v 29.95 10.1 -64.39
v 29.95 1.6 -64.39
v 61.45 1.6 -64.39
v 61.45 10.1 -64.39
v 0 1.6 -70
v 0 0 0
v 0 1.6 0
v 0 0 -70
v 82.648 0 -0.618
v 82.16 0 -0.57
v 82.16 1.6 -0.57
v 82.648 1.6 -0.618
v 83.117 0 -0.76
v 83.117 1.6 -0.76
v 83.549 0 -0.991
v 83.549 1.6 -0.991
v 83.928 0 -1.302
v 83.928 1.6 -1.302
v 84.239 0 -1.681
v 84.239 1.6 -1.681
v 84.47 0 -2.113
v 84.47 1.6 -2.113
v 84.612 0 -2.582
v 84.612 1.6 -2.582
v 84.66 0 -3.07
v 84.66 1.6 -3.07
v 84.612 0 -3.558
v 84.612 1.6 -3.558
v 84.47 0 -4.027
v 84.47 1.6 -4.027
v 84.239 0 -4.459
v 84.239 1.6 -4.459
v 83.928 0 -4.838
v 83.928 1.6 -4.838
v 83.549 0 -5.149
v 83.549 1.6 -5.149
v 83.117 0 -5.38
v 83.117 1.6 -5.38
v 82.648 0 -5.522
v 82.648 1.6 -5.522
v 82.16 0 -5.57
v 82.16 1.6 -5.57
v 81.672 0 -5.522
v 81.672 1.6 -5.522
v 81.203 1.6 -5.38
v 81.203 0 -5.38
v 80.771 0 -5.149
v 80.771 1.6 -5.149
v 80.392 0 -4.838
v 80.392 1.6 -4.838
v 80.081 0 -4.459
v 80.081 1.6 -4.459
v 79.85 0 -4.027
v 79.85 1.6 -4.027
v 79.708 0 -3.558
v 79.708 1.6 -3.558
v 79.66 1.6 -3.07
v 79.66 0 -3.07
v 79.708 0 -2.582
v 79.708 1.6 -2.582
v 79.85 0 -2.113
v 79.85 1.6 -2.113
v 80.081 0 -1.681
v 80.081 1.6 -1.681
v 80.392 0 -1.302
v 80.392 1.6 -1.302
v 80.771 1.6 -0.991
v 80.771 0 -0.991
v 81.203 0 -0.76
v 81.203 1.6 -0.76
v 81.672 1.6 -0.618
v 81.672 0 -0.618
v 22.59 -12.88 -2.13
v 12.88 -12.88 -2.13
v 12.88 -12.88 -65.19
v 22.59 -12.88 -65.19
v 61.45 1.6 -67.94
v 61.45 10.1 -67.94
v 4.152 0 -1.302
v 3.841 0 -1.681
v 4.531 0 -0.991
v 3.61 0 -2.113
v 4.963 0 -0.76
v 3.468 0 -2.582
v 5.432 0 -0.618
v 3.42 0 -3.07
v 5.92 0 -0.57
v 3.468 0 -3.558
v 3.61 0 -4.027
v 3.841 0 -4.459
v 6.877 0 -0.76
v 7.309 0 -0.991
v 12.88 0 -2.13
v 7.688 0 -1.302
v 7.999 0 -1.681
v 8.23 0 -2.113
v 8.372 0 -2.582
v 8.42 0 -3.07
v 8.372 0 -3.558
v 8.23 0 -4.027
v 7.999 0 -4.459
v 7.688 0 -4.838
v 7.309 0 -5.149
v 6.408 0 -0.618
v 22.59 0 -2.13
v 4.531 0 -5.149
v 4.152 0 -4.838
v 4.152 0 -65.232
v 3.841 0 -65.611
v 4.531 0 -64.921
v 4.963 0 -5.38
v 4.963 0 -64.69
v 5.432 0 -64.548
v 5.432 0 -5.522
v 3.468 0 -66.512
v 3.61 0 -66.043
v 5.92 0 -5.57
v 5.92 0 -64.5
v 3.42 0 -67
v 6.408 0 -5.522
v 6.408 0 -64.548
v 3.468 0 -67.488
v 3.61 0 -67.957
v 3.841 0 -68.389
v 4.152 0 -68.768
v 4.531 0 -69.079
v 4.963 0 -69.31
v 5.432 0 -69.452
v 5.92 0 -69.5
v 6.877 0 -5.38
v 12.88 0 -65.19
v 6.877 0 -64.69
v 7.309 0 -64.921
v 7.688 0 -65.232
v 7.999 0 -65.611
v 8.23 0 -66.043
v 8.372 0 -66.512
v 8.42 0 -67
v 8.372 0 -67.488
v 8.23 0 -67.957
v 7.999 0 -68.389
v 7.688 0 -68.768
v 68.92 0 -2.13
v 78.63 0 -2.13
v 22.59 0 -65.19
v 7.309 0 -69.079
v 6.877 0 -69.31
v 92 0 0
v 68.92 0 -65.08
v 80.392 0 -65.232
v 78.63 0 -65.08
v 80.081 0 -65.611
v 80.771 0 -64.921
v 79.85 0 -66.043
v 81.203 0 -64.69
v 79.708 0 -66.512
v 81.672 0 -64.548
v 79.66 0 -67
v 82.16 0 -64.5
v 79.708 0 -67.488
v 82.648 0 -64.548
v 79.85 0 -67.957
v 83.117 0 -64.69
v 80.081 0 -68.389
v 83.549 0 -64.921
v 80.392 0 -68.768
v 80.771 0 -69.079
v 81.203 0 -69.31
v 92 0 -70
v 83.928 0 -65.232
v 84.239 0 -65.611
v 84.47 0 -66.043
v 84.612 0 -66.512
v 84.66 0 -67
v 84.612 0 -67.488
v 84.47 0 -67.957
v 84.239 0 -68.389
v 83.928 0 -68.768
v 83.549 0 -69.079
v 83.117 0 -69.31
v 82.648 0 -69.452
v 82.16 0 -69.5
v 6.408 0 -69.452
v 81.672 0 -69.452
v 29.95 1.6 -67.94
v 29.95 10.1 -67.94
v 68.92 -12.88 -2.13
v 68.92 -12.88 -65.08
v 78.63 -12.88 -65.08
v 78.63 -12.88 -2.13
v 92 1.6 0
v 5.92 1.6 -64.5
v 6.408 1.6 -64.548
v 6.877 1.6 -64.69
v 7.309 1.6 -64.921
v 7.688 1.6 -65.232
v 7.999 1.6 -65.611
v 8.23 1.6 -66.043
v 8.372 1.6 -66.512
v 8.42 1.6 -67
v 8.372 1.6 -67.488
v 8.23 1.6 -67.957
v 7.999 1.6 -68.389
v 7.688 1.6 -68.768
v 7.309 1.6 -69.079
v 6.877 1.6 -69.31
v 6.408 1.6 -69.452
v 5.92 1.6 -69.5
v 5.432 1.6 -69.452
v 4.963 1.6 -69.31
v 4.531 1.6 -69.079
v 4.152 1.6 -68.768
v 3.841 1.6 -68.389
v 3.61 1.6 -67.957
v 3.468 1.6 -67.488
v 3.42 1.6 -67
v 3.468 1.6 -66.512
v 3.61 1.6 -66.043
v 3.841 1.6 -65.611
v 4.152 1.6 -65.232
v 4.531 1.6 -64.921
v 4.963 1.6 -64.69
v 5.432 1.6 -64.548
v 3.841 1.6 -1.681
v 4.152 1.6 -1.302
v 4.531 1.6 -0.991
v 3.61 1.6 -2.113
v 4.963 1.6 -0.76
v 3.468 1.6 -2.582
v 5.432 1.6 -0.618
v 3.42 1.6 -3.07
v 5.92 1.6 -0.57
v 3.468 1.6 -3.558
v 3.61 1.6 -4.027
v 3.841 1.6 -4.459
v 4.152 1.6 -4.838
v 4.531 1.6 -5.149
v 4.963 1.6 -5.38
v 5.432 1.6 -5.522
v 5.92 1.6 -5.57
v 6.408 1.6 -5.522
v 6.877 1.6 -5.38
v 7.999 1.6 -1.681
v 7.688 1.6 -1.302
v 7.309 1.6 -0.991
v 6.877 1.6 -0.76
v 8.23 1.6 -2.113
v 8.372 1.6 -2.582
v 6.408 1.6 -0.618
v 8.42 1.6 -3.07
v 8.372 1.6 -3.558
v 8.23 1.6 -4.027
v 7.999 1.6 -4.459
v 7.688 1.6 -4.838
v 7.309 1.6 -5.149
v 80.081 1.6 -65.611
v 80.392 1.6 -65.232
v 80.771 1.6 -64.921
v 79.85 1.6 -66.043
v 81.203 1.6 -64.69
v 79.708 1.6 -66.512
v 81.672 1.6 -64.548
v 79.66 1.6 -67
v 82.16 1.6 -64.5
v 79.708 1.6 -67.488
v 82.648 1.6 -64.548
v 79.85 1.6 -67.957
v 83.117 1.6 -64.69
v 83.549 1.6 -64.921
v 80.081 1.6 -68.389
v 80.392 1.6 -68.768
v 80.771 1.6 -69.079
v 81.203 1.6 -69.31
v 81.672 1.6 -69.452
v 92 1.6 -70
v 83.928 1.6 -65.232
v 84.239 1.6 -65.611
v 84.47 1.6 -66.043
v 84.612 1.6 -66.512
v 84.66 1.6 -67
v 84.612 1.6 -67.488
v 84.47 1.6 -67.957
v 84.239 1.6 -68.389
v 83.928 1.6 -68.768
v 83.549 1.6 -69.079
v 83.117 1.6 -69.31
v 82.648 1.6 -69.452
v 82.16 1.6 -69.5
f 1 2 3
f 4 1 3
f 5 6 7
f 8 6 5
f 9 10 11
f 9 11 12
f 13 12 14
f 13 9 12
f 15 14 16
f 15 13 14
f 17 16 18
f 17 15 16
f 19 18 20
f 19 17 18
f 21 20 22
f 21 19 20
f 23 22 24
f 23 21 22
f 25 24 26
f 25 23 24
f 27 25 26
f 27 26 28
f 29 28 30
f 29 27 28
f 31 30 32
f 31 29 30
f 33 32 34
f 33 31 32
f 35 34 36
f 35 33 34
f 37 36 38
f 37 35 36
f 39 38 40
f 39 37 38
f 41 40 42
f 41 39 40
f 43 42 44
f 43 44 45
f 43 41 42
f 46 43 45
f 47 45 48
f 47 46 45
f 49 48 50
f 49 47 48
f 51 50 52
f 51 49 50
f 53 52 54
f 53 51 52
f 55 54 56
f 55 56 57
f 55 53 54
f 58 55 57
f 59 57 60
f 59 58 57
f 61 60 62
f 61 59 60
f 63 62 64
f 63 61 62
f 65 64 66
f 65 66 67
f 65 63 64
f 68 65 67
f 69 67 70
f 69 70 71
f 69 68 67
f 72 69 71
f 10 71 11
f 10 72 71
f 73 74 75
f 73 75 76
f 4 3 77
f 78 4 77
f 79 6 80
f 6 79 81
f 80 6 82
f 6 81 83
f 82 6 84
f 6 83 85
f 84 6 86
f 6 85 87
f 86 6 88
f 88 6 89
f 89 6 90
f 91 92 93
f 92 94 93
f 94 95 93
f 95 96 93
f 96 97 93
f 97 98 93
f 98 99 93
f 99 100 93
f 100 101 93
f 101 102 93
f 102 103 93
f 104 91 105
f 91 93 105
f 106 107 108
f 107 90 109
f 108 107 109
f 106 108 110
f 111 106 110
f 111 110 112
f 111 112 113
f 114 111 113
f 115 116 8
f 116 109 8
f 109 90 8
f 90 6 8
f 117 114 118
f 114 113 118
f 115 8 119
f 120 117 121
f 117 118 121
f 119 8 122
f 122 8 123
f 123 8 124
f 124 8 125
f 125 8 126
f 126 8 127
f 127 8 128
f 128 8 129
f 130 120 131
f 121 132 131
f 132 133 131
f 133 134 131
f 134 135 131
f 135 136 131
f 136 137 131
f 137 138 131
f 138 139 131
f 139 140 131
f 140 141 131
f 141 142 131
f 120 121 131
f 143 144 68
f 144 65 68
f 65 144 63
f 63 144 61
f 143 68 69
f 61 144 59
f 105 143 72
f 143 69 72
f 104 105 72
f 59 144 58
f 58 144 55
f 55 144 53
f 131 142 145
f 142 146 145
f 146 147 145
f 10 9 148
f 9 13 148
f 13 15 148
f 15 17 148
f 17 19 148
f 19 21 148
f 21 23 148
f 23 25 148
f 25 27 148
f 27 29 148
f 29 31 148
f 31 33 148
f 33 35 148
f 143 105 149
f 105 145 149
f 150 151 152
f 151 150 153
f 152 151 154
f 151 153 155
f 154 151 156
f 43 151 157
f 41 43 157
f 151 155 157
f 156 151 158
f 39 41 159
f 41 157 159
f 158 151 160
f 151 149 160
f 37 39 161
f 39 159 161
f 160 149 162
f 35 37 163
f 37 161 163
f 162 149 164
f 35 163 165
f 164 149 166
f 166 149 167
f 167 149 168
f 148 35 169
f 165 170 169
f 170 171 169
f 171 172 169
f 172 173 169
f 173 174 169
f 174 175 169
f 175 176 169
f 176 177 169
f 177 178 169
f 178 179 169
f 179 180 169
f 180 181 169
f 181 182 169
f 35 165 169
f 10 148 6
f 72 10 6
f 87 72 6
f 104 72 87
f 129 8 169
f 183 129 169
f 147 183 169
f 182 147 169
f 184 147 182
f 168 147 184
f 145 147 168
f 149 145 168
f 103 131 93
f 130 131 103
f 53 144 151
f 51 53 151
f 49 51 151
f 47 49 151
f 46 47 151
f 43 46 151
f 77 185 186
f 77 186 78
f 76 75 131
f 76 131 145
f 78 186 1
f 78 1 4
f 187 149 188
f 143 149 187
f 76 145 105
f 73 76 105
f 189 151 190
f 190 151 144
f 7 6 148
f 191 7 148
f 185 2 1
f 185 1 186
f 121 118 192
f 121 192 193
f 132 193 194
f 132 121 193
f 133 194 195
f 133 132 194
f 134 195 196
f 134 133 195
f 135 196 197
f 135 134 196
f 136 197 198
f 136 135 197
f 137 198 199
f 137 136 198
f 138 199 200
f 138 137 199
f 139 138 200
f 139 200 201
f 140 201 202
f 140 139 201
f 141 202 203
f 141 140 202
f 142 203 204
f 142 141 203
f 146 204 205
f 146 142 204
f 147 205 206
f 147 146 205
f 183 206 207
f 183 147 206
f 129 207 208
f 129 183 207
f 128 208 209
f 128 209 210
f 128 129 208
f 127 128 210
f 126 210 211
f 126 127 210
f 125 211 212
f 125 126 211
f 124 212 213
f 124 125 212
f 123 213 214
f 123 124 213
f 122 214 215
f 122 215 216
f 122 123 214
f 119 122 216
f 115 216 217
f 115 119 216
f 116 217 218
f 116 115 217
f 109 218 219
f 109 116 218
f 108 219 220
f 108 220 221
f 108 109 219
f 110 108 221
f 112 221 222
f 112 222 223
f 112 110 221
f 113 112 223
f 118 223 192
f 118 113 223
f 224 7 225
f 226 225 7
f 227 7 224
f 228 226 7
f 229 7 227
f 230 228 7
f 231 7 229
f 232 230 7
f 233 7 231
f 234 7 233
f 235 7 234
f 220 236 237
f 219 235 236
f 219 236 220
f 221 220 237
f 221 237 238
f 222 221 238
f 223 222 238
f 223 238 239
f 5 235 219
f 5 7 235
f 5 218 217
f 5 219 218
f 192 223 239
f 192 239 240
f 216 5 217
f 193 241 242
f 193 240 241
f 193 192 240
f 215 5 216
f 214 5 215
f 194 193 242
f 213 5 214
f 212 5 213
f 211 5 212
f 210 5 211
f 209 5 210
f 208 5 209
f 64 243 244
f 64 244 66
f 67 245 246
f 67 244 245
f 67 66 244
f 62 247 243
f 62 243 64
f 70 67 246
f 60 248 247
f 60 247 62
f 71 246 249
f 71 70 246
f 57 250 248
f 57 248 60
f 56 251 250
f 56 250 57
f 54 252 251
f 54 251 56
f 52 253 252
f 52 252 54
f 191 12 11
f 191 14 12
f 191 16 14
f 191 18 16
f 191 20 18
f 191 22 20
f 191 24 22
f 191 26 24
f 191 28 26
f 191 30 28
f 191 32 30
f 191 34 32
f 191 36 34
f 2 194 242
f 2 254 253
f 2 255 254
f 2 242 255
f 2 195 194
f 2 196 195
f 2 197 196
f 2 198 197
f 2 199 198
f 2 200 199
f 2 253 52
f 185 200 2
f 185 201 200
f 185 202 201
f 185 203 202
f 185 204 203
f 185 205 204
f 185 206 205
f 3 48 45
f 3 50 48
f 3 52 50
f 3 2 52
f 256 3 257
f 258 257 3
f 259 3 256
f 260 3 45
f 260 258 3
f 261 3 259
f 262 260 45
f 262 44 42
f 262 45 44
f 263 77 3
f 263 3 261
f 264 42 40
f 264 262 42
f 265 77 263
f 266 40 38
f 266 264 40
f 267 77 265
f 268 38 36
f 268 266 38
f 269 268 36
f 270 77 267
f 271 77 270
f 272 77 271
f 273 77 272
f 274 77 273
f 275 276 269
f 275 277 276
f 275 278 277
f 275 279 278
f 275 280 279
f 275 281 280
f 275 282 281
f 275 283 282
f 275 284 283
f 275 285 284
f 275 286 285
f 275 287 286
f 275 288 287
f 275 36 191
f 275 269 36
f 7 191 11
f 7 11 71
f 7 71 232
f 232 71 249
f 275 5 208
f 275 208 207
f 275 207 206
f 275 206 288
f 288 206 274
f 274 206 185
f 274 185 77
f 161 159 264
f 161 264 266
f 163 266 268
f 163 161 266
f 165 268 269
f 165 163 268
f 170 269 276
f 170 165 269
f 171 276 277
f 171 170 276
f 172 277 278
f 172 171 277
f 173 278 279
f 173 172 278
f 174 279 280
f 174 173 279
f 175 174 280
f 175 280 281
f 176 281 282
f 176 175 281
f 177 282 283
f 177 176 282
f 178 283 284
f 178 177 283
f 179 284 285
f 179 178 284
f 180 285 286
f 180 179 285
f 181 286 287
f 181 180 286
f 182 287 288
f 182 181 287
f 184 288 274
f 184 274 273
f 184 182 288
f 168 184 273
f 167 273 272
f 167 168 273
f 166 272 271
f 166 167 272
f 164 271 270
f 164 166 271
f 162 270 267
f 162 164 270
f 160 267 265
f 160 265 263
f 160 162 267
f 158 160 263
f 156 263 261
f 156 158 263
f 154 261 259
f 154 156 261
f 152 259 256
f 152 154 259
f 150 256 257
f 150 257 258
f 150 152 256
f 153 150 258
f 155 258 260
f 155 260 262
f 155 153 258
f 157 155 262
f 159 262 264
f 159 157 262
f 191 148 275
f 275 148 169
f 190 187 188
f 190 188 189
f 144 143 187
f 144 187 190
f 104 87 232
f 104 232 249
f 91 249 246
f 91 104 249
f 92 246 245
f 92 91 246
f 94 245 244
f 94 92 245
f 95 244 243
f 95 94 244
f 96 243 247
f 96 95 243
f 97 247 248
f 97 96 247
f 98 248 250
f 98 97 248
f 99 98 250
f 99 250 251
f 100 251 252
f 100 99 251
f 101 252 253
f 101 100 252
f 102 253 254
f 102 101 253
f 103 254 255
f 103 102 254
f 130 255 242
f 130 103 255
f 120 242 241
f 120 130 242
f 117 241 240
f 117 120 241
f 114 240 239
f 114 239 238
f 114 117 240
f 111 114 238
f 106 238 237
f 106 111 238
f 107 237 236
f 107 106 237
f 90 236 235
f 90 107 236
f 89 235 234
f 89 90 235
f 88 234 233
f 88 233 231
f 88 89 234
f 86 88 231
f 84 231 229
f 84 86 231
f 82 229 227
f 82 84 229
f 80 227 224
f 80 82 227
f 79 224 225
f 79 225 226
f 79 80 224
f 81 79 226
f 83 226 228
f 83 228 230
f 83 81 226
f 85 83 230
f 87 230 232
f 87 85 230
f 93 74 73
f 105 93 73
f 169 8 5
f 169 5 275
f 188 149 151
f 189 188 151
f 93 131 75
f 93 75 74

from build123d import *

# Parameters (mm, degrees)
SKETCH1_W                = 92
SKETCH1_H                = 70
SKETCH1_R                = 2.5
Y_PCB_EXTR_DEPTH         = 1.6
SKETCH2_W                = 31.5
SKETCH2_H                = 3.55
Y_HEADER_EXTR_DEPTH      = 8.5
SKETCH3_W                = 9.71
SKETCH3_H                = 62.95
SKETCH3_H_2              = 63.06
Y_MOLEX_POWER_EXTR_DEPTH = 12.88


with BuildPart() as part:
    # Sketch1 → Y+ PCB extr (new body)
    with BuildSketch(Plane(origin=(0, 0, 0), x_dir=(1, 0, 0), z_dir=(0, 1, 0))):
        with Locations((46, 35)):
            Rectangle(SKETCH1_W, SKETCH1_H)
        with Locations(Location((5.92, 3.07, 0), (0, 0, 270))):
            Circle(SKETCH1_R, mode=Mode.SUBTRACT)
        with Locations(Location((82.16, 3.07, 0), (0, 0, 270))):
            Circle(SKETCH1_R, mode=Mode.SUBTRACT)
        with Locations(Location((82.16, 67, 0), (0, 0, 270))):
            Circle(SKETCH1_R, mode=Mode.SUBTRACT)
        with Locations(Location((5.92, 67, 0), (0, 0, 270))):
            Circle(SKETCH1_R, mode=Mode.SUBTRACT)
    extrude(amount=Y_PCB_EXTR_DEPTH)

    # Sketch2 → Y+ header extr (add)
    with BuildSketch(Plane(origin=(0, 1.6, 0), x_dir=(1, 0, 0), z_dir=(0, 1, 0))):
        with Locations((45.7, 66.165)):
            Rectangle(SKETCH2_W, SKETCH2_H)
    extrude(amount=Y_HEADER_EXTR_DEPTH)

    # Sketch3 → Y- MOLEX power extr (add)
    with BuildSketch(Plane.XZ):
        with Locations((73.775, -33.605)):
            Rectangle(SKETCH3_W, SKETCH3_H)
        with Locations((17.735, -33.66)):
            Rectangle(SKETCH3_W, SKETCH3_H_2)
    extrude(amount=Y_MOLEX_POWER_EXTR_DEPTH)


solid = part.part
